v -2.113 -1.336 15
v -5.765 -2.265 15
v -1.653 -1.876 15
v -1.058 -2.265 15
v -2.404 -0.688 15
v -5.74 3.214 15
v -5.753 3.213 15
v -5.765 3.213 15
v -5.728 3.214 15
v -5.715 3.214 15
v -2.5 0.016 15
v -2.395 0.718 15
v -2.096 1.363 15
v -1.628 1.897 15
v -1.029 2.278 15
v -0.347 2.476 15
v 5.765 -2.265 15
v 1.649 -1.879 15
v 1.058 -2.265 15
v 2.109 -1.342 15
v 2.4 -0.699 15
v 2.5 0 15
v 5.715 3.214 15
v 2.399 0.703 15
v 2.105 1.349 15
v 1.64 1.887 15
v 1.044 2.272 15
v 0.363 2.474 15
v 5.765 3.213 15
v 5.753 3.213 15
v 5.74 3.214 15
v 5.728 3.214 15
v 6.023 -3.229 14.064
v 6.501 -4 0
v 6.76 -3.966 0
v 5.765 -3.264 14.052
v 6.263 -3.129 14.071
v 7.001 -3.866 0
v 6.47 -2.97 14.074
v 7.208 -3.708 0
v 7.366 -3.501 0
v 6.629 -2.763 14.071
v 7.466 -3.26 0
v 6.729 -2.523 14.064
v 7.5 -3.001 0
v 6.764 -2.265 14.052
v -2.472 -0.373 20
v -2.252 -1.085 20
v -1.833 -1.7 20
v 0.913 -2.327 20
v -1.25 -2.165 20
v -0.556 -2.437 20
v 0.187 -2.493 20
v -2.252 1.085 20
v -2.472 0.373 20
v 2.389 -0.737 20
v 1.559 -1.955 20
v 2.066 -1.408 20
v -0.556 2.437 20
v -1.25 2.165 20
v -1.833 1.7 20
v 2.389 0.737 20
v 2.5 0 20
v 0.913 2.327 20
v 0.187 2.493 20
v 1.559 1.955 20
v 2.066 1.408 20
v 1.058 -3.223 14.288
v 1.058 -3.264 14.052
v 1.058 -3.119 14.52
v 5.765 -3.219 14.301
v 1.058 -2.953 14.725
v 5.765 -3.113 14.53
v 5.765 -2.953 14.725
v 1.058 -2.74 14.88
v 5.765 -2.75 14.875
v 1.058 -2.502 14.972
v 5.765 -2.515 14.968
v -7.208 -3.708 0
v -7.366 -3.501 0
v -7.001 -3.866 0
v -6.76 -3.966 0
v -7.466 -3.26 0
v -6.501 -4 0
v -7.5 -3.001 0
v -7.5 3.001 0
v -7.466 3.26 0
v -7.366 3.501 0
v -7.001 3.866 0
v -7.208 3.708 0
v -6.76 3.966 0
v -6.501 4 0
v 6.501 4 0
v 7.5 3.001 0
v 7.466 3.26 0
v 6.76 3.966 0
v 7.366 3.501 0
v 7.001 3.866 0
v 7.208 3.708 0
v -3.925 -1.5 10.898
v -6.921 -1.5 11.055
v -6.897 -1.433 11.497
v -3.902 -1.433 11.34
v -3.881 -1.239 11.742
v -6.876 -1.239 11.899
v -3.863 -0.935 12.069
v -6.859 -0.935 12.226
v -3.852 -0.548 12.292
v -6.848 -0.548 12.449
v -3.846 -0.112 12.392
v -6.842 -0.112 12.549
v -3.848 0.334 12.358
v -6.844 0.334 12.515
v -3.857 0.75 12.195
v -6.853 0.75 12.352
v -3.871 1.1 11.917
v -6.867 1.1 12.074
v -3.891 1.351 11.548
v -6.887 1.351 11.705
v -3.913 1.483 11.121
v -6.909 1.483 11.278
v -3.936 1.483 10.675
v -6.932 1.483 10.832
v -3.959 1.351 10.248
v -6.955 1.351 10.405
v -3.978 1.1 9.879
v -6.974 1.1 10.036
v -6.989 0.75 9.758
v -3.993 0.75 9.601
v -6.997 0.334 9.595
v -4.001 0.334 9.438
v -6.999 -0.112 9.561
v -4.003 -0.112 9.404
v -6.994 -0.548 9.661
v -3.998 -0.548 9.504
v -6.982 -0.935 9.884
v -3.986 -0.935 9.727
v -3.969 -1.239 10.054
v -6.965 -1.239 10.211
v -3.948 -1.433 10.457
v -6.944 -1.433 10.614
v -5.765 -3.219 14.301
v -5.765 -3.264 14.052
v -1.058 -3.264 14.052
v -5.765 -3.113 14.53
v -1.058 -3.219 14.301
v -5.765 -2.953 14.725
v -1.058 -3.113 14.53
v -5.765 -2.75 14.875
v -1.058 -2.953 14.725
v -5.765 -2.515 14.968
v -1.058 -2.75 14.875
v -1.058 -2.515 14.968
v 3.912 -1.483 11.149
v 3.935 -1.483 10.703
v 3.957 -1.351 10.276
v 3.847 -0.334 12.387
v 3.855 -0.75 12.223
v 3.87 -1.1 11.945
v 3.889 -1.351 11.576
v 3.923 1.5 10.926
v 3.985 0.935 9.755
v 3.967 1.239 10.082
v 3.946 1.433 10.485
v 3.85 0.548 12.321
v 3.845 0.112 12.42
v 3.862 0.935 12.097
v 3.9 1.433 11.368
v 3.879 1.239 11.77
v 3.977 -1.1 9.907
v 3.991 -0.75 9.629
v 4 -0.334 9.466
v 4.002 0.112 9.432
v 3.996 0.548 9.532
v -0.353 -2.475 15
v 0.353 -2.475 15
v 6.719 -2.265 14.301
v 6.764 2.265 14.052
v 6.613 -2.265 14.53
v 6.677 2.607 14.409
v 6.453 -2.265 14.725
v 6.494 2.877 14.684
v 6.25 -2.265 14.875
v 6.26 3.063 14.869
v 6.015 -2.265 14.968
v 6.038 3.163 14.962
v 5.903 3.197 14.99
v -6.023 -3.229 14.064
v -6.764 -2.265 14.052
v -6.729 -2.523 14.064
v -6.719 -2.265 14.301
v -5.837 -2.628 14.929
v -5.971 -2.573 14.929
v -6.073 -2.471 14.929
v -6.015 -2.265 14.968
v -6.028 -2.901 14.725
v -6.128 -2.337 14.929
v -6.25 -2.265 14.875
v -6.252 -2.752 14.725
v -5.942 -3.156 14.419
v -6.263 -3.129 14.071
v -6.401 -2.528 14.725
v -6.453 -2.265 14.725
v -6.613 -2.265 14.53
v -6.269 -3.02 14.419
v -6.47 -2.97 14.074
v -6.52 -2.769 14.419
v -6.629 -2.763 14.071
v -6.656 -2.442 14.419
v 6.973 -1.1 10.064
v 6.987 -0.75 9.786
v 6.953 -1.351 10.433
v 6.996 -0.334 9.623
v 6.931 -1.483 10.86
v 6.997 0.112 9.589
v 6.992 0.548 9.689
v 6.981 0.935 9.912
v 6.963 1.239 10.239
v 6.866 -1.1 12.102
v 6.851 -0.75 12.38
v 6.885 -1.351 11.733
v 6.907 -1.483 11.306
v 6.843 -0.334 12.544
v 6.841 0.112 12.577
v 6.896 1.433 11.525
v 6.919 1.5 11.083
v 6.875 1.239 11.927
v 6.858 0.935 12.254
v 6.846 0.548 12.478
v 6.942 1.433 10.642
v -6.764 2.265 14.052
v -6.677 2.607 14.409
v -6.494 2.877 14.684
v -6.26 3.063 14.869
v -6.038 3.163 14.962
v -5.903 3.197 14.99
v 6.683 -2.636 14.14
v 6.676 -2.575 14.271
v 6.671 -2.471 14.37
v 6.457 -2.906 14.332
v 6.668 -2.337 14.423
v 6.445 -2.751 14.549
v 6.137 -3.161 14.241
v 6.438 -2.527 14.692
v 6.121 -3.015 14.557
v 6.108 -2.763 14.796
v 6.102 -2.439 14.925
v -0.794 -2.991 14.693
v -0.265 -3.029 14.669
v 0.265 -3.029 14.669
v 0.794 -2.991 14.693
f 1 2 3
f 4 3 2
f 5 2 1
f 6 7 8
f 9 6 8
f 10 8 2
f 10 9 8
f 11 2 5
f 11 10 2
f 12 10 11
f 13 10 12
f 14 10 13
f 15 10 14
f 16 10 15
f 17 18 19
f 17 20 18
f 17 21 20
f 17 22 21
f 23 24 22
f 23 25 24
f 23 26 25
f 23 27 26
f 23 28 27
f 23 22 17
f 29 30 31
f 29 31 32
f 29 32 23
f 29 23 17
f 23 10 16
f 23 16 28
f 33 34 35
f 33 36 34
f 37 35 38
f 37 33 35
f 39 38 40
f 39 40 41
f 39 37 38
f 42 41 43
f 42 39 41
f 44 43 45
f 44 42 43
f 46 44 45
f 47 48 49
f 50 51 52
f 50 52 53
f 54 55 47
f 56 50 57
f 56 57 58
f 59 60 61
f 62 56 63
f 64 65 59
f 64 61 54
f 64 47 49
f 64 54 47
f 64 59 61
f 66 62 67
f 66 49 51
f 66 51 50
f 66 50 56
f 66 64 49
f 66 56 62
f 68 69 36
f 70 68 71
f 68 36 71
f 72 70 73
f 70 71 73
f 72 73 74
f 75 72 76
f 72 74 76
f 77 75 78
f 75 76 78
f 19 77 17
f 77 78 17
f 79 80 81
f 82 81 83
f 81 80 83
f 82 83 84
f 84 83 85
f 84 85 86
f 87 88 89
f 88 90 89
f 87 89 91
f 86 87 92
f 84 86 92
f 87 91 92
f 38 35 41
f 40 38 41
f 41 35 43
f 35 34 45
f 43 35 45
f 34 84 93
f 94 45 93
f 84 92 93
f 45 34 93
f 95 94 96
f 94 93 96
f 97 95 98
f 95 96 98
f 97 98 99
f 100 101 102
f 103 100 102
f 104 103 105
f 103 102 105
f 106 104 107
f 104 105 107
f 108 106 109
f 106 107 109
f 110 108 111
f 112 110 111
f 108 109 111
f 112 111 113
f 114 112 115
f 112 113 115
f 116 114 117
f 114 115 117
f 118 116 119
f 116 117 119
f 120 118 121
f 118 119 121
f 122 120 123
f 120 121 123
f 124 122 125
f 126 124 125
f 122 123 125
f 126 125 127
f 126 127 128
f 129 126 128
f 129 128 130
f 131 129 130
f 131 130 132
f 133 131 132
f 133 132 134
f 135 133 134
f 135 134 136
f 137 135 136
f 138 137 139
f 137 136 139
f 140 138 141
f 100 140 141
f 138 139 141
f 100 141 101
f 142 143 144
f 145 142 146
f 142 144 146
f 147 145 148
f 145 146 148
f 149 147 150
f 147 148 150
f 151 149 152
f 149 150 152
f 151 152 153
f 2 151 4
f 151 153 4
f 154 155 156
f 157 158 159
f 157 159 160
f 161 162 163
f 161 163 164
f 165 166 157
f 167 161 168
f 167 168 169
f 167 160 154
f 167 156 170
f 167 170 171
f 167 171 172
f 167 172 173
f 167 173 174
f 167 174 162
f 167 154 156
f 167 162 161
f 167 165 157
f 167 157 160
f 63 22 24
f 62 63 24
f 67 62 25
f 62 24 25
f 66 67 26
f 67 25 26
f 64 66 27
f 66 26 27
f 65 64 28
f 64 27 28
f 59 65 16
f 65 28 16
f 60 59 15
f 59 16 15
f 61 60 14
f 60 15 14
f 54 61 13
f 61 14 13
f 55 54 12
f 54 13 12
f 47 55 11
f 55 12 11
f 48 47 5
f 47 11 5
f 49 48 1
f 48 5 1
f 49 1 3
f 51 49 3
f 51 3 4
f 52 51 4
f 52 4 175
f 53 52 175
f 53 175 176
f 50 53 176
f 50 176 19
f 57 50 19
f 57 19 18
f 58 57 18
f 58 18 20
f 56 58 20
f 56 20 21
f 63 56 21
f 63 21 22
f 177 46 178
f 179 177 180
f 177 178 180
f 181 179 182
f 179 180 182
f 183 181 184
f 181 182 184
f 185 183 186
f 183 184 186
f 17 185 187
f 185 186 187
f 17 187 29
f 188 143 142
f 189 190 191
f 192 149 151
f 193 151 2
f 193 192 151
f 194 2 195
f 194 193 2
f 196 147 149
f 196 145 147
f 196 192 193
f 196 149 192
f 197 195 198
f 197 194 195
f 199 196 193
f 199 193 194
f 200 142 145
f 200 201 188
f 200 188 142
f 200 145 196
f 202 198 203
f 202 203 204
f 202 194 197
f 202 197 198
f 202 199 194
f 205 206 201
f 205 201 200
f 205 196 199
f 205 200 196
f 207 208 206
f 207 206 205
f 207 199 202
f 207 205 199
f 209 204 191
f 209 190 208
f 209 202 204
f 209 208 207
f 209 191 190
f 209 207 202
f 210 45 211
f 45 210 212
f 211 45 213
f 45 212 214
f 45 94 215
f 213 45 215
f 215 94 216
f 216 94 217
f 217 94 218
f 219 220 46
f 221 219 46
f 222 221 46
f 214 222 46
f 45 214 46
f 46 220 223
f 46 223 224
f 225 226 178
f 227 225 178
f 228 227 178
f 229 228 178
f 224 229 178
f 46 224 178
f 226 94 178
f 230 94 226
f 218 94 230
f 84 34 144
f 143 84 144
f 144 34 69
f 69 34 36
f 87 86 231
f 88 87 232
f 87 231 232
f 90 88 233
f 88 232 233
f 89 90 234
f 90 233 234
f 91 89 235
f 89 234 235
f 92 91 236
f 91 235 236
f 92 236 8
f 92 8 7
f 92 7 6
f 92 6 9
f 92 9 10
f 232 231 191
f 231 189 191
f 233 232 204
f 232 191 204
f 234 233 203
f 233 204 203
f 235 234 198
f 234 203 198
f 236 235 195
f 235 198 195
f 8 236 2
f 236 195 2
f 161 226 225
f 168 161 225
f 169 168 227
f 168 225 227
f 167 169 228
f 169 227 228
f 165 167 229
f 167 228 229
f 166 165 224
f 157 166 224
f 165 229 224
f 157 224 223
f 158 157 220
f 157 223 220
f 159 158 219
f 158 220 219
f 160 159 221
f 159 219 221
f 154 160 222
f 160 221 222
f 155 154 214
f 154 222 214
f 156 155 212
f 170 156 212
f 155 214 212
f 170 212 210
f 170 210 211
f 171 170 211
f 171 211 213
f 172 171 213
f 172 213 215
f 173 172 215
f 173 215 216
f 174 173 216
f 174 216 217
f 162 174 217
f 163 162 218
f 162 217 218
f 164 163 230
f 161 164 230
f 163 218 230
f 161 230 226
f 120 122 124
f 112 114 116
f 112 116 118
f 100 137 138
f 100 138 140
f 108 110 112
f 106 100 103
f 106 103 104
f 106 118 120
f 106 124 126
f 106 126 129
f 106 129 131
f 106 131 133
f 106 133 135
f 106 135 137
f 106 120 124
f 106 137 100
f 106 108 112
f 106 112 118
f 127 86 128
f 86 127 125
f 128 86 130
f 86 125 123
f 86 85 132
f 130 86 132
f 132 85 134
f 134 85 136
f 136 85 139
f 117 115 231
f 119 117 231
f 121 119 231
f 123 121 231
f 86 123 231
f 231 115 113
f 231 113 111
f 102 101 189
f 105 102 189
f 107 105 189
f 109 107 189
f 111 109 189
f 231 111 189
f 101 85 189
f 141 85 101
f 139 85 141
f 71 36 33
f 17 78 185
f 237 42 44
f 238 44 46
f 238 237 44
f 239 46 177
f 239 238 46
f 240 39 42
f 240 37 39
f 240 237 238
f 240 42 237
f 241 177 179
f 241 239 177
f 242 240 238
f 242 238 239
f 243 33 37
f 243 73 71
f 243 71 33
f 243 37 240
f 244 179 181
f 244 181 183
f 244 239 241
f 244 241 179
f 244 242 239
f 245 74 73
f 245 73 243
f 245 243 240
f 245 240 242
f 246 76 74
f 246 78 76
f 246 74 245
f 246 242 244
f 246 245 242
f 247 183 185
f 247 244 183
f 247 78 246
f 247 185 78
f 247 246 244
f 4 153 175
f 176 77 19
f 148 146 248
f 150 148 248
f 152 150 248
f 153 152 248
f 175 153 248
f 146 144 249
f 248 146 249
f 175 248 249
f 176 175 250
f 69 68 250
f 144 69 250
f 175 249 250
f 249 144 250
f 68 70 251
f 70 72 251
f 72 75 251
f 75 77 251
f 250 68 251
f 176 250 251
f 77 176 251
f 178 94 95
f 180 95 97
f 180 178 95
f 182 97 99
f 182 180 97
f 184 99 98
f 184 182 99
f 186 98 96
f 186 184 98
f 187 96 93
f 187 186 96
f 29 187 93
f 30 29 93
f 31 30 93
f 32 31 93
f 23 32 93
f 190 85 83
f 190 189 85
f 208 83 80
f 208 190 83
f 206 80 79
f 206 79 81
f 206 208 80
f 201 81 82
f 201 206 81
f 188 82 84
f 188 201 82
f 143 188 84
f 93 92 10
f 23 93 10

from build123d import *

# Parameters (mm, degrees)
F0_W     = 15
F0_H     = 8
F1_DEPTH = 15
F1_TAPER = 3
F2_R     = 2.5
F3_DEPTH = 5
F4_R     = 1
F5_R     = 1.5
F6_DEPTH = 3
F7_R     = 1.5
F8_DEPTH = 3


with BuildPart() as f1:
    # F0 (on Top) → F1 (new body)
    with BuildSketch(Plane.XY):
        Rectangle(F0_W, F0_H)
    extrude(amount=F1_DEPTH, taper=F1_TAPER)

    # F2 (on face) → F3 (join)
    with BuildSketch(Plane.XY.offset(15)):
        Circle(F2_R)
    extrude(amount=F3_DEPTH)

    # F4
    f4_edges = [f1.edges().sort_by_distance(p)[0] for p in [
        (-7.106942, -3.606942, 7.5),
        (0, -3.213883, 15),
        (7.106942, -3.606942, 7.5),
        (6.713883, 0, 15),
        (7.106942, 3.606942, 7.5),
        (-6.713883, 0, 15),
        (-7.106942, 3.606942, 7.5),
    ]]
    fillet(f4_edges, radius=F4_R)

    # F5 (on face) → F6 (cut)
    with BuildSketch(Plane(origin=(-7.4794571076, 0, 0.3919817373), x_dir=(0, -1, 0), z_dir=(-0.9986295348, 0, 0.0523359562))):
        with Locations((0, 10.6777304862)):
            Circle(F5_R)
    extrude(amount=-F6_DEPTH, mode=Mode.SUBTRACT)

    # F7 (on face) → F8 (cut)
    with BuildSketch(Plane(origin=(7.4794571076, 0, 0.3919817373), x_dir=(0, 1, 0), z_dir=(0.9986295348, 0, 0.0523359562))):
        with Locations((0, 10.7058982886)):
            Circle(F7_R)
    extrude(amount=-F8_DEPTH, mode=Mode.SUBTRACT)


solid = f1.part
